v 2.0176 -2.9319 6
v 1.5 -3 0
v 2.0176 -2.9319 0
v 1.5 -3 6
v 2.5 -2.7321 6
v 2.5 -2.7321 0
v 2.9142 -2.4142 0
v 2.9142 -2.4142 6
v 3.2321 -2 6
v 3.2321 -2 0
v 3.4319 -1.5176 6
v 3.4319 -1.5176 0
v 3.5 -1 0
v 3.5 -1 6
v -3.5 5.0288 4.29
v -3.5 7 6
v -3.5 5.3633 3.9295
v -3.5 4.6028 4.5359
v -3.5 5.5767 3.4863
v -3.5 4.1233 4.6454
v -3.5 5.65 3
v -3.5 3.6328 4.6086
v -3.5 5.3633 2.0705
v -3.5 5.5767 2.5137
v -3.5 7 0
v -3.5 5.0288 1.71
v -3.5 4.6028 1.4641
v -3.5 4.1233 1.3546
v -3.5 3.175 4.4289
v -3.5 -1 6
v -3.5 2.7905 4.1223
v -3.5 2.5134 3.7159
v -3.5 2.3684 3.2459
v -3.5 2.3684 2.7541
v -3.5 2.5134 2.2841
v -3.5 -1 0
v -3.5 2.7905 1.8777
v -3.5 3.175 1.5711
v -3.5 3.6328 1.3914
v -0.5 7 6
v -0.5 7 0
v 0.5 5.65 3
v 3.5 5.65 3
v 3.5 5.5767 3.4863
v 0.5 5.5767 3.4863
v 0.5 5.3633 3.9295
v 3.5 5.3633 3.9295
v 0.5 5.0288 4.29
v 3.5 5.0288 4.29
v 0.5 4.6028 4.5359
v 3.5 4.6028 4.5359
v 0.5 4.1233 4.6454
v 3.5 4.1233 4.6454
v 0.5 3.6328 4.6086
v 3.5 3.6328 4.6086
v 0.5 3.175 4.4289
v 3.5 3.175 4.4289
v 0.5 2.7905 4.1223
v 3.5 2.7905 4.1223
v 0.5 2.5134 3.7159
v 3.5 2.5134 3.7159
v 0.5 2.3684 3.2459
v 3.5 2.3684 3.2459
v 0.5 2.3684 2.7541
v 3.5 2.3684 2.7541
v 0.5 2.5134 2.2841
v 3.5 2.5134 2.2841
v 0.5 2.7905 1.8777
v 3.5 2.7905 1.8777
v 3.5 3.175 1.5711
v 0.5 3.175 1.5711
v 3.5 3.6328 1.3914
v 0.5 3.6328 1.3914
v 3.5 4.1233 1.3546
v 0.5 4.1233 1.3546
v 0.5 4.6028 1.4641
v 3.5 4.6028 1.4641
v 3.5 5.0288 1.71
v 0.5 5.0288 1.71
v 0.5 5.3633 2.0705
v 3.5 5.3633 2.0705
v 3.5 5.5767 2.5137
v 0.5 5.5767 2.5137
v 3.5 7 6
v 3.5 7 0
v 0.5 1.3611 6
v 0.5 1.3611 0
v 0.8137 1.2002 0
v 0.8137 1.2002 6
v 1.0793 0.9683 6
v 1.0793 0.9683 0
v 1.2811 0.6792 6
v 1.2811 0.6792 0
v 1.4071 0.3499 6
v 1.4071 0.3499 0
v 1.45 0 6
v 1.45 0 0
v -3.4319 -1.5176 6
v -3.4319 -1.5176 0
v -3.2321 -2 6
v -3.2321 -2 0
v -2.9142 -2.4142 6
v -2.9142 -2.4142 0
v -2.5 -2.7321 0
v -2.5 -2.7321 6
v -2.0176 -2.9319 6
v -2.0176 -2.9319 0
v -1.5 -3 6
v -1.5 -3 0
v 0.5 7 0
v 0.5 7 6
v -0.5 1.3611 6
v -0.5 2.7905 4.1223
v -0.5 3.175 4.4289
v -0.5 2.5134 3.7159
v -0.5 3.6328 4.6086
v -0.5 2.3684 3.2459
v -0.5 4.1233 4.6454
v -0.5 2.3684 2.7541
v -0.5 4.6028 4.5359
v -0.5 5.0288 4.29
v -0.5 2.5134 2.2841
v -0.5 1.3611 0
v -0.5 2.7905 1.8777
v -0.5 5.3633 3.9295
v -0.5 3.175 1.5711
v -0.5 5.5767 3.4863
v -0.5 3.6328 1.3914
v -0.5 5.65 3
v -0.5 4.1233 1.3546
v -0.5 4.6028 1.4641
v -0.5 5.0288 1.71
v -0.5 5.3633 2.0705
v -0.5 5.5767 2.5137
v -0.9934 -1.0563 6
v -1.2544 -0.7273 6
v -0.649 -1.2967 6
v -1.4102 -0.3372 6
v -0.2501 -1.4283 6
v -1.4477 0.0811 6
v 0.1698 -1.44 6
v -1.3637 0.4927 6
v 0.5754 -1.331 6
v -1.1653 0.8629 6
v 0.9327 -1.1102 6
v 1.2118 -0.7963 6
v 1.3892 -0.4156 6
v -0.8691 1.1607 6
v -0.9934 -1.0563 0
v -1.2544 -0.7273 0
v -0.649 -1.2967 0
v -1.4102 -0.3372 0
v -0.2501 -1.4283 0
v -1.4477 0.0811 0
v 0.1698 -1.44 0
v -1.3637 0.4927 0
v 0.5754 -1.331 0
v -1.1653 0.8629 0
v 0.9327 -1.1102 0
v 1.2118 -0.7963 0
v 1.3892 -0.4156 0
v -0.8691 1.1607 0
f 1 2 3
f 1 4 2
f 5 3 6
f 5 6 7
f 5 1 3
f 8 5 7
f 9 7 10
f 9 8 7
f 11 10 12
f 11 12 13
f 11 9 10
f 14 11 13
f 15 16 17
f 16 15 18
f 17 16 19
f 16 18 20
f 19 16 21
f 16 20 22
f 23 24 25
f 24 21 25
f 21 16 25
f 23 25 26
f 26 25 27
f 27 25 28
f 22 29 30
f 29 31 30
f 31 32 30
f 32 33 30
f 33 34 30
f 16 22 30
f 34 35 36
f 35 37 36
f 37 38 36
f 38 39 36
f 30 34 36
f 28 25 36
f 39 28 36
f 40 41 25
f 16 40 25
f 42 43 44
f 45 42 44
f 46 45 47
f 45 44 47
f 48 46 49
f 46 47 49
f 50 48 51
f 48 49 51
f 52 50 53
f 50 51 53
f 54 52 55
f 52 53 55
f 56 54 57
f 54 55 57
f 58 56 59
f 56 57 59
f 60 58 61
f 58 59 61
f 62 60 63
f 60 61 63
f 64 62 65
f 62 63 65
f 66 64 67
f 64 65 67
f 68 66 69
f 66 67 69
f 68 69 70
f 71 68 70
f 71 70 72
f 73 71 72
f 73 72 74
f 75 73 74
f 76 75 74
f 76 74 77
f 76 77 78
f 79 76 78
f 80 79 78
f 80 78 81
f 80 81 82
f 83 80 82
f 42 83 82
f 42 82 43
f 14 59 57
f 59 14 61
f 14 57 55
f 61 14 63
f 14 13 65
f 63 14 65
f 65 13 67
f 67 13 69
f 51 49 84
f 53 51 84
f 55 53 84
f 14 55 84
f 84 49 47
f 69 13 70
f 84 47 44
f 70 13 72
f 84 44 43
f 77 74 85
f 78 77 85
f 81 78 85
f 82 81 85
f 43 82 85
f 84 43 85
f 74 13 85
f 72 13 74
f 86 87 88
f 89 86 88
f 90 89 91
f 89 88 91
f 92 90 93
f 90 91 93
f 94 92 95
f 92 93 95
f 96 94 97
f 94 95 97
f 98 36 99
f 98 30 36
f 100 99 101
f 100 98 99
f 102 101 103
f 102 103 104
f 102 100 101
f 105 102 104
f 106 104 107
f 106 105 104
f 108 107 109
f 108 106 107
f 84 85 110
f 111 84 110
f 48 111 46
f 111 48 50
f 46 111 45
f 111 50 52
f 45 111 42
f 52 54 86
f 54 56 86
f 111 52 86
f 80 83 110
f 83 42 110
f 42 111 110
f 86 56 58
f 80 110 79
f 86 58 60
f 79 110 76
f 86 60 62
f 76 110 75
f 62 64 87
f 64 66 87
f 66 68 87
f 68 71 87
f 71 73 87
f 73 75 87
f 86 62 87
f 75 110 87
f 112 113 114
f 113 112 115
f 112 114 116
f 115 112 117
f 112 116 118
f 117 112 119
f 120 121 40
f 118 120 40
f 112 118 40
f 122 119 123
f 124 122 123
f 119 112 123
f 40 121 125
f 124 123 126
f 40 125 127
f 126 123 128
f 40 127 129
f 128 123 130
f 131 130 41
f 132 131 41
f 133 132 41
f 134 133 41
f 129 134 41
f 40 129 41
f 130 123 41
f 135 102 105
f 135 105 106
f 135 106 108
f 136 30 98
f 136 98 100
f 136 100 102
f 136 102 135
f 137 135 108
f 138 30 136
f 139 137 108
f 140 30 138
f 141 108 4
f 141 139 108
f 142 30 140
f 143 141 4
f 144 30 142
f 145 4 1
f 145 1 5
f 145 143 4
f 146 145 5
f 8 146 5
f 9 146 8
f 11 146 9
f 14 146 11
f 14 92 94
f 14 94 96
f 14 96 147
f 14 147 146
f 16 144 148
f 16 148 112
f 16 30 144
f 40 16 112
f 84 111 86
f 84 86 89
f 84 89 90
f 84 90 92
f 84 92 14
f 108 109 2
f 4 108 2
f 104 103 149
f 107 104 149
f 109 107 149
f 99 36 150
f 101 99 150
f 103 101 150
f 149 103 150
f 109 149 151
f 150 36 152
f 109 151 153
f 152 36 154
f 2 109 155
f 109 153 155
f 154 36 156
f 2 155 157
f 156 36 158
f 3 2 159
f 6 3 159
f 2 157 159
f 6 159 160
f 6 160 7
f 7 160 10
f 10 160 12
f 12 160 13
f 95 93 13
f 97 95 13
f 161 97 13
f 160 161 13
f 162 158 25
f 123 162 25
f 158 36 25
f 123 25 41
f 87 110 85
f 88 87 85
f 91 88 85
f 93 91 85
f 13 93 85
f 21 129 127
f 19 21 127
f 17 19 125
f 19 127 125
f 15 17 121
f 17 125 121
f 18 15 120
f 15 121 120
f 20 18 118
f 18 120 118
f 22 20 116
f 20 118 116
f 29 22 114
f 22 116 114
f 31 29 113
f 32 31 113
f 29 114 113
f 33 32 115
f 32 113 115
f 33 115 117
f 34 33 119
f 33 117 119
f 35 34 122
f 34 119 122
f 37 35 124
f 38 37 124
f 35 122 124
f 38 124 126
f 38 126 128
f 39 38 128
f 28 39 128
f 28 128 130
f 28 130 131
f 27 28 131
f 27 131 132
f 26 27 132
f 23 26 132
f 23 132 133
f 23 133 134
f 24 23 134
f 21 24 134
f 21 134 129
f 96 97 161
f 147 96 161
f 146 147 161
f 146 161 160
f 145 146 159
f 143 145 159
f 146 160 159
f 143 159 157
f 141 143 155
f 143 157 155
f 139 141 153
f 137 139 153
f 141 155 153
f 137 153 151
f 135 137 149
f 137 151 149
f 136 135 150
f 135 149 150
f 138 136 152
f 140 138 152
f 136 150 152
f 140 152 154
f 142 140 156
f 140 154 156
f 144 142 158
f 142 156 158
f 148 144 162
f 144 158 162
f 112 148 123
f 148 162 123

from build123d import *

# Parameters (mm, degrees)
F1_DEPTH = 6
F2_R     = 1.65
F3_DEPTH = 25
F4_R     = 2


with BuildPart() as f1:
    # F0 (on Top) → F1 (new body)
    with BuildSketch(Plane.XY):
        with BuildLine():
            Line((-0.5, 7), (-3.5, 7))
            Line((-3.5, 7), (-3.5, -3))
            Line((-3.5, -3), (3.5, -3))
            Line((3.5, -3), (3.5, 7))
            Line((3.5, 7), (0.5, 7))
            Line((0.5, 7), (0.5, 1.361066))
            ThreePointArc((0.5, 1.361066), (1.189012, 0.82991), (1.45, 0))
            ThreePointArc((1.45, 0), (-0.82991, -1.189012), (-0.5, 1.361066))
            Line((-0.5, 1.361066), (-0.5, 7))
        make_face()
    extrude(amount=F1_DEPTH)

    # F2 (on face) → F3 (cut)
    with BuildSketch(Plane.YZ.offset(3.5)):
        with Locations((4, 3)):
            Circle(F2_R)
    extrude(amount=-F3_DEPTH, mode=Mode.SUBTRACT)

    # F4
    f4_edges = [f1.edges().sort_by_distance(p)[0] for p in [
        (3.5, -3, 3),
        (-3.5, -3, 3),
    ]]
    fillet(f4_edges, radius=F4_R)


solid = f1.part
